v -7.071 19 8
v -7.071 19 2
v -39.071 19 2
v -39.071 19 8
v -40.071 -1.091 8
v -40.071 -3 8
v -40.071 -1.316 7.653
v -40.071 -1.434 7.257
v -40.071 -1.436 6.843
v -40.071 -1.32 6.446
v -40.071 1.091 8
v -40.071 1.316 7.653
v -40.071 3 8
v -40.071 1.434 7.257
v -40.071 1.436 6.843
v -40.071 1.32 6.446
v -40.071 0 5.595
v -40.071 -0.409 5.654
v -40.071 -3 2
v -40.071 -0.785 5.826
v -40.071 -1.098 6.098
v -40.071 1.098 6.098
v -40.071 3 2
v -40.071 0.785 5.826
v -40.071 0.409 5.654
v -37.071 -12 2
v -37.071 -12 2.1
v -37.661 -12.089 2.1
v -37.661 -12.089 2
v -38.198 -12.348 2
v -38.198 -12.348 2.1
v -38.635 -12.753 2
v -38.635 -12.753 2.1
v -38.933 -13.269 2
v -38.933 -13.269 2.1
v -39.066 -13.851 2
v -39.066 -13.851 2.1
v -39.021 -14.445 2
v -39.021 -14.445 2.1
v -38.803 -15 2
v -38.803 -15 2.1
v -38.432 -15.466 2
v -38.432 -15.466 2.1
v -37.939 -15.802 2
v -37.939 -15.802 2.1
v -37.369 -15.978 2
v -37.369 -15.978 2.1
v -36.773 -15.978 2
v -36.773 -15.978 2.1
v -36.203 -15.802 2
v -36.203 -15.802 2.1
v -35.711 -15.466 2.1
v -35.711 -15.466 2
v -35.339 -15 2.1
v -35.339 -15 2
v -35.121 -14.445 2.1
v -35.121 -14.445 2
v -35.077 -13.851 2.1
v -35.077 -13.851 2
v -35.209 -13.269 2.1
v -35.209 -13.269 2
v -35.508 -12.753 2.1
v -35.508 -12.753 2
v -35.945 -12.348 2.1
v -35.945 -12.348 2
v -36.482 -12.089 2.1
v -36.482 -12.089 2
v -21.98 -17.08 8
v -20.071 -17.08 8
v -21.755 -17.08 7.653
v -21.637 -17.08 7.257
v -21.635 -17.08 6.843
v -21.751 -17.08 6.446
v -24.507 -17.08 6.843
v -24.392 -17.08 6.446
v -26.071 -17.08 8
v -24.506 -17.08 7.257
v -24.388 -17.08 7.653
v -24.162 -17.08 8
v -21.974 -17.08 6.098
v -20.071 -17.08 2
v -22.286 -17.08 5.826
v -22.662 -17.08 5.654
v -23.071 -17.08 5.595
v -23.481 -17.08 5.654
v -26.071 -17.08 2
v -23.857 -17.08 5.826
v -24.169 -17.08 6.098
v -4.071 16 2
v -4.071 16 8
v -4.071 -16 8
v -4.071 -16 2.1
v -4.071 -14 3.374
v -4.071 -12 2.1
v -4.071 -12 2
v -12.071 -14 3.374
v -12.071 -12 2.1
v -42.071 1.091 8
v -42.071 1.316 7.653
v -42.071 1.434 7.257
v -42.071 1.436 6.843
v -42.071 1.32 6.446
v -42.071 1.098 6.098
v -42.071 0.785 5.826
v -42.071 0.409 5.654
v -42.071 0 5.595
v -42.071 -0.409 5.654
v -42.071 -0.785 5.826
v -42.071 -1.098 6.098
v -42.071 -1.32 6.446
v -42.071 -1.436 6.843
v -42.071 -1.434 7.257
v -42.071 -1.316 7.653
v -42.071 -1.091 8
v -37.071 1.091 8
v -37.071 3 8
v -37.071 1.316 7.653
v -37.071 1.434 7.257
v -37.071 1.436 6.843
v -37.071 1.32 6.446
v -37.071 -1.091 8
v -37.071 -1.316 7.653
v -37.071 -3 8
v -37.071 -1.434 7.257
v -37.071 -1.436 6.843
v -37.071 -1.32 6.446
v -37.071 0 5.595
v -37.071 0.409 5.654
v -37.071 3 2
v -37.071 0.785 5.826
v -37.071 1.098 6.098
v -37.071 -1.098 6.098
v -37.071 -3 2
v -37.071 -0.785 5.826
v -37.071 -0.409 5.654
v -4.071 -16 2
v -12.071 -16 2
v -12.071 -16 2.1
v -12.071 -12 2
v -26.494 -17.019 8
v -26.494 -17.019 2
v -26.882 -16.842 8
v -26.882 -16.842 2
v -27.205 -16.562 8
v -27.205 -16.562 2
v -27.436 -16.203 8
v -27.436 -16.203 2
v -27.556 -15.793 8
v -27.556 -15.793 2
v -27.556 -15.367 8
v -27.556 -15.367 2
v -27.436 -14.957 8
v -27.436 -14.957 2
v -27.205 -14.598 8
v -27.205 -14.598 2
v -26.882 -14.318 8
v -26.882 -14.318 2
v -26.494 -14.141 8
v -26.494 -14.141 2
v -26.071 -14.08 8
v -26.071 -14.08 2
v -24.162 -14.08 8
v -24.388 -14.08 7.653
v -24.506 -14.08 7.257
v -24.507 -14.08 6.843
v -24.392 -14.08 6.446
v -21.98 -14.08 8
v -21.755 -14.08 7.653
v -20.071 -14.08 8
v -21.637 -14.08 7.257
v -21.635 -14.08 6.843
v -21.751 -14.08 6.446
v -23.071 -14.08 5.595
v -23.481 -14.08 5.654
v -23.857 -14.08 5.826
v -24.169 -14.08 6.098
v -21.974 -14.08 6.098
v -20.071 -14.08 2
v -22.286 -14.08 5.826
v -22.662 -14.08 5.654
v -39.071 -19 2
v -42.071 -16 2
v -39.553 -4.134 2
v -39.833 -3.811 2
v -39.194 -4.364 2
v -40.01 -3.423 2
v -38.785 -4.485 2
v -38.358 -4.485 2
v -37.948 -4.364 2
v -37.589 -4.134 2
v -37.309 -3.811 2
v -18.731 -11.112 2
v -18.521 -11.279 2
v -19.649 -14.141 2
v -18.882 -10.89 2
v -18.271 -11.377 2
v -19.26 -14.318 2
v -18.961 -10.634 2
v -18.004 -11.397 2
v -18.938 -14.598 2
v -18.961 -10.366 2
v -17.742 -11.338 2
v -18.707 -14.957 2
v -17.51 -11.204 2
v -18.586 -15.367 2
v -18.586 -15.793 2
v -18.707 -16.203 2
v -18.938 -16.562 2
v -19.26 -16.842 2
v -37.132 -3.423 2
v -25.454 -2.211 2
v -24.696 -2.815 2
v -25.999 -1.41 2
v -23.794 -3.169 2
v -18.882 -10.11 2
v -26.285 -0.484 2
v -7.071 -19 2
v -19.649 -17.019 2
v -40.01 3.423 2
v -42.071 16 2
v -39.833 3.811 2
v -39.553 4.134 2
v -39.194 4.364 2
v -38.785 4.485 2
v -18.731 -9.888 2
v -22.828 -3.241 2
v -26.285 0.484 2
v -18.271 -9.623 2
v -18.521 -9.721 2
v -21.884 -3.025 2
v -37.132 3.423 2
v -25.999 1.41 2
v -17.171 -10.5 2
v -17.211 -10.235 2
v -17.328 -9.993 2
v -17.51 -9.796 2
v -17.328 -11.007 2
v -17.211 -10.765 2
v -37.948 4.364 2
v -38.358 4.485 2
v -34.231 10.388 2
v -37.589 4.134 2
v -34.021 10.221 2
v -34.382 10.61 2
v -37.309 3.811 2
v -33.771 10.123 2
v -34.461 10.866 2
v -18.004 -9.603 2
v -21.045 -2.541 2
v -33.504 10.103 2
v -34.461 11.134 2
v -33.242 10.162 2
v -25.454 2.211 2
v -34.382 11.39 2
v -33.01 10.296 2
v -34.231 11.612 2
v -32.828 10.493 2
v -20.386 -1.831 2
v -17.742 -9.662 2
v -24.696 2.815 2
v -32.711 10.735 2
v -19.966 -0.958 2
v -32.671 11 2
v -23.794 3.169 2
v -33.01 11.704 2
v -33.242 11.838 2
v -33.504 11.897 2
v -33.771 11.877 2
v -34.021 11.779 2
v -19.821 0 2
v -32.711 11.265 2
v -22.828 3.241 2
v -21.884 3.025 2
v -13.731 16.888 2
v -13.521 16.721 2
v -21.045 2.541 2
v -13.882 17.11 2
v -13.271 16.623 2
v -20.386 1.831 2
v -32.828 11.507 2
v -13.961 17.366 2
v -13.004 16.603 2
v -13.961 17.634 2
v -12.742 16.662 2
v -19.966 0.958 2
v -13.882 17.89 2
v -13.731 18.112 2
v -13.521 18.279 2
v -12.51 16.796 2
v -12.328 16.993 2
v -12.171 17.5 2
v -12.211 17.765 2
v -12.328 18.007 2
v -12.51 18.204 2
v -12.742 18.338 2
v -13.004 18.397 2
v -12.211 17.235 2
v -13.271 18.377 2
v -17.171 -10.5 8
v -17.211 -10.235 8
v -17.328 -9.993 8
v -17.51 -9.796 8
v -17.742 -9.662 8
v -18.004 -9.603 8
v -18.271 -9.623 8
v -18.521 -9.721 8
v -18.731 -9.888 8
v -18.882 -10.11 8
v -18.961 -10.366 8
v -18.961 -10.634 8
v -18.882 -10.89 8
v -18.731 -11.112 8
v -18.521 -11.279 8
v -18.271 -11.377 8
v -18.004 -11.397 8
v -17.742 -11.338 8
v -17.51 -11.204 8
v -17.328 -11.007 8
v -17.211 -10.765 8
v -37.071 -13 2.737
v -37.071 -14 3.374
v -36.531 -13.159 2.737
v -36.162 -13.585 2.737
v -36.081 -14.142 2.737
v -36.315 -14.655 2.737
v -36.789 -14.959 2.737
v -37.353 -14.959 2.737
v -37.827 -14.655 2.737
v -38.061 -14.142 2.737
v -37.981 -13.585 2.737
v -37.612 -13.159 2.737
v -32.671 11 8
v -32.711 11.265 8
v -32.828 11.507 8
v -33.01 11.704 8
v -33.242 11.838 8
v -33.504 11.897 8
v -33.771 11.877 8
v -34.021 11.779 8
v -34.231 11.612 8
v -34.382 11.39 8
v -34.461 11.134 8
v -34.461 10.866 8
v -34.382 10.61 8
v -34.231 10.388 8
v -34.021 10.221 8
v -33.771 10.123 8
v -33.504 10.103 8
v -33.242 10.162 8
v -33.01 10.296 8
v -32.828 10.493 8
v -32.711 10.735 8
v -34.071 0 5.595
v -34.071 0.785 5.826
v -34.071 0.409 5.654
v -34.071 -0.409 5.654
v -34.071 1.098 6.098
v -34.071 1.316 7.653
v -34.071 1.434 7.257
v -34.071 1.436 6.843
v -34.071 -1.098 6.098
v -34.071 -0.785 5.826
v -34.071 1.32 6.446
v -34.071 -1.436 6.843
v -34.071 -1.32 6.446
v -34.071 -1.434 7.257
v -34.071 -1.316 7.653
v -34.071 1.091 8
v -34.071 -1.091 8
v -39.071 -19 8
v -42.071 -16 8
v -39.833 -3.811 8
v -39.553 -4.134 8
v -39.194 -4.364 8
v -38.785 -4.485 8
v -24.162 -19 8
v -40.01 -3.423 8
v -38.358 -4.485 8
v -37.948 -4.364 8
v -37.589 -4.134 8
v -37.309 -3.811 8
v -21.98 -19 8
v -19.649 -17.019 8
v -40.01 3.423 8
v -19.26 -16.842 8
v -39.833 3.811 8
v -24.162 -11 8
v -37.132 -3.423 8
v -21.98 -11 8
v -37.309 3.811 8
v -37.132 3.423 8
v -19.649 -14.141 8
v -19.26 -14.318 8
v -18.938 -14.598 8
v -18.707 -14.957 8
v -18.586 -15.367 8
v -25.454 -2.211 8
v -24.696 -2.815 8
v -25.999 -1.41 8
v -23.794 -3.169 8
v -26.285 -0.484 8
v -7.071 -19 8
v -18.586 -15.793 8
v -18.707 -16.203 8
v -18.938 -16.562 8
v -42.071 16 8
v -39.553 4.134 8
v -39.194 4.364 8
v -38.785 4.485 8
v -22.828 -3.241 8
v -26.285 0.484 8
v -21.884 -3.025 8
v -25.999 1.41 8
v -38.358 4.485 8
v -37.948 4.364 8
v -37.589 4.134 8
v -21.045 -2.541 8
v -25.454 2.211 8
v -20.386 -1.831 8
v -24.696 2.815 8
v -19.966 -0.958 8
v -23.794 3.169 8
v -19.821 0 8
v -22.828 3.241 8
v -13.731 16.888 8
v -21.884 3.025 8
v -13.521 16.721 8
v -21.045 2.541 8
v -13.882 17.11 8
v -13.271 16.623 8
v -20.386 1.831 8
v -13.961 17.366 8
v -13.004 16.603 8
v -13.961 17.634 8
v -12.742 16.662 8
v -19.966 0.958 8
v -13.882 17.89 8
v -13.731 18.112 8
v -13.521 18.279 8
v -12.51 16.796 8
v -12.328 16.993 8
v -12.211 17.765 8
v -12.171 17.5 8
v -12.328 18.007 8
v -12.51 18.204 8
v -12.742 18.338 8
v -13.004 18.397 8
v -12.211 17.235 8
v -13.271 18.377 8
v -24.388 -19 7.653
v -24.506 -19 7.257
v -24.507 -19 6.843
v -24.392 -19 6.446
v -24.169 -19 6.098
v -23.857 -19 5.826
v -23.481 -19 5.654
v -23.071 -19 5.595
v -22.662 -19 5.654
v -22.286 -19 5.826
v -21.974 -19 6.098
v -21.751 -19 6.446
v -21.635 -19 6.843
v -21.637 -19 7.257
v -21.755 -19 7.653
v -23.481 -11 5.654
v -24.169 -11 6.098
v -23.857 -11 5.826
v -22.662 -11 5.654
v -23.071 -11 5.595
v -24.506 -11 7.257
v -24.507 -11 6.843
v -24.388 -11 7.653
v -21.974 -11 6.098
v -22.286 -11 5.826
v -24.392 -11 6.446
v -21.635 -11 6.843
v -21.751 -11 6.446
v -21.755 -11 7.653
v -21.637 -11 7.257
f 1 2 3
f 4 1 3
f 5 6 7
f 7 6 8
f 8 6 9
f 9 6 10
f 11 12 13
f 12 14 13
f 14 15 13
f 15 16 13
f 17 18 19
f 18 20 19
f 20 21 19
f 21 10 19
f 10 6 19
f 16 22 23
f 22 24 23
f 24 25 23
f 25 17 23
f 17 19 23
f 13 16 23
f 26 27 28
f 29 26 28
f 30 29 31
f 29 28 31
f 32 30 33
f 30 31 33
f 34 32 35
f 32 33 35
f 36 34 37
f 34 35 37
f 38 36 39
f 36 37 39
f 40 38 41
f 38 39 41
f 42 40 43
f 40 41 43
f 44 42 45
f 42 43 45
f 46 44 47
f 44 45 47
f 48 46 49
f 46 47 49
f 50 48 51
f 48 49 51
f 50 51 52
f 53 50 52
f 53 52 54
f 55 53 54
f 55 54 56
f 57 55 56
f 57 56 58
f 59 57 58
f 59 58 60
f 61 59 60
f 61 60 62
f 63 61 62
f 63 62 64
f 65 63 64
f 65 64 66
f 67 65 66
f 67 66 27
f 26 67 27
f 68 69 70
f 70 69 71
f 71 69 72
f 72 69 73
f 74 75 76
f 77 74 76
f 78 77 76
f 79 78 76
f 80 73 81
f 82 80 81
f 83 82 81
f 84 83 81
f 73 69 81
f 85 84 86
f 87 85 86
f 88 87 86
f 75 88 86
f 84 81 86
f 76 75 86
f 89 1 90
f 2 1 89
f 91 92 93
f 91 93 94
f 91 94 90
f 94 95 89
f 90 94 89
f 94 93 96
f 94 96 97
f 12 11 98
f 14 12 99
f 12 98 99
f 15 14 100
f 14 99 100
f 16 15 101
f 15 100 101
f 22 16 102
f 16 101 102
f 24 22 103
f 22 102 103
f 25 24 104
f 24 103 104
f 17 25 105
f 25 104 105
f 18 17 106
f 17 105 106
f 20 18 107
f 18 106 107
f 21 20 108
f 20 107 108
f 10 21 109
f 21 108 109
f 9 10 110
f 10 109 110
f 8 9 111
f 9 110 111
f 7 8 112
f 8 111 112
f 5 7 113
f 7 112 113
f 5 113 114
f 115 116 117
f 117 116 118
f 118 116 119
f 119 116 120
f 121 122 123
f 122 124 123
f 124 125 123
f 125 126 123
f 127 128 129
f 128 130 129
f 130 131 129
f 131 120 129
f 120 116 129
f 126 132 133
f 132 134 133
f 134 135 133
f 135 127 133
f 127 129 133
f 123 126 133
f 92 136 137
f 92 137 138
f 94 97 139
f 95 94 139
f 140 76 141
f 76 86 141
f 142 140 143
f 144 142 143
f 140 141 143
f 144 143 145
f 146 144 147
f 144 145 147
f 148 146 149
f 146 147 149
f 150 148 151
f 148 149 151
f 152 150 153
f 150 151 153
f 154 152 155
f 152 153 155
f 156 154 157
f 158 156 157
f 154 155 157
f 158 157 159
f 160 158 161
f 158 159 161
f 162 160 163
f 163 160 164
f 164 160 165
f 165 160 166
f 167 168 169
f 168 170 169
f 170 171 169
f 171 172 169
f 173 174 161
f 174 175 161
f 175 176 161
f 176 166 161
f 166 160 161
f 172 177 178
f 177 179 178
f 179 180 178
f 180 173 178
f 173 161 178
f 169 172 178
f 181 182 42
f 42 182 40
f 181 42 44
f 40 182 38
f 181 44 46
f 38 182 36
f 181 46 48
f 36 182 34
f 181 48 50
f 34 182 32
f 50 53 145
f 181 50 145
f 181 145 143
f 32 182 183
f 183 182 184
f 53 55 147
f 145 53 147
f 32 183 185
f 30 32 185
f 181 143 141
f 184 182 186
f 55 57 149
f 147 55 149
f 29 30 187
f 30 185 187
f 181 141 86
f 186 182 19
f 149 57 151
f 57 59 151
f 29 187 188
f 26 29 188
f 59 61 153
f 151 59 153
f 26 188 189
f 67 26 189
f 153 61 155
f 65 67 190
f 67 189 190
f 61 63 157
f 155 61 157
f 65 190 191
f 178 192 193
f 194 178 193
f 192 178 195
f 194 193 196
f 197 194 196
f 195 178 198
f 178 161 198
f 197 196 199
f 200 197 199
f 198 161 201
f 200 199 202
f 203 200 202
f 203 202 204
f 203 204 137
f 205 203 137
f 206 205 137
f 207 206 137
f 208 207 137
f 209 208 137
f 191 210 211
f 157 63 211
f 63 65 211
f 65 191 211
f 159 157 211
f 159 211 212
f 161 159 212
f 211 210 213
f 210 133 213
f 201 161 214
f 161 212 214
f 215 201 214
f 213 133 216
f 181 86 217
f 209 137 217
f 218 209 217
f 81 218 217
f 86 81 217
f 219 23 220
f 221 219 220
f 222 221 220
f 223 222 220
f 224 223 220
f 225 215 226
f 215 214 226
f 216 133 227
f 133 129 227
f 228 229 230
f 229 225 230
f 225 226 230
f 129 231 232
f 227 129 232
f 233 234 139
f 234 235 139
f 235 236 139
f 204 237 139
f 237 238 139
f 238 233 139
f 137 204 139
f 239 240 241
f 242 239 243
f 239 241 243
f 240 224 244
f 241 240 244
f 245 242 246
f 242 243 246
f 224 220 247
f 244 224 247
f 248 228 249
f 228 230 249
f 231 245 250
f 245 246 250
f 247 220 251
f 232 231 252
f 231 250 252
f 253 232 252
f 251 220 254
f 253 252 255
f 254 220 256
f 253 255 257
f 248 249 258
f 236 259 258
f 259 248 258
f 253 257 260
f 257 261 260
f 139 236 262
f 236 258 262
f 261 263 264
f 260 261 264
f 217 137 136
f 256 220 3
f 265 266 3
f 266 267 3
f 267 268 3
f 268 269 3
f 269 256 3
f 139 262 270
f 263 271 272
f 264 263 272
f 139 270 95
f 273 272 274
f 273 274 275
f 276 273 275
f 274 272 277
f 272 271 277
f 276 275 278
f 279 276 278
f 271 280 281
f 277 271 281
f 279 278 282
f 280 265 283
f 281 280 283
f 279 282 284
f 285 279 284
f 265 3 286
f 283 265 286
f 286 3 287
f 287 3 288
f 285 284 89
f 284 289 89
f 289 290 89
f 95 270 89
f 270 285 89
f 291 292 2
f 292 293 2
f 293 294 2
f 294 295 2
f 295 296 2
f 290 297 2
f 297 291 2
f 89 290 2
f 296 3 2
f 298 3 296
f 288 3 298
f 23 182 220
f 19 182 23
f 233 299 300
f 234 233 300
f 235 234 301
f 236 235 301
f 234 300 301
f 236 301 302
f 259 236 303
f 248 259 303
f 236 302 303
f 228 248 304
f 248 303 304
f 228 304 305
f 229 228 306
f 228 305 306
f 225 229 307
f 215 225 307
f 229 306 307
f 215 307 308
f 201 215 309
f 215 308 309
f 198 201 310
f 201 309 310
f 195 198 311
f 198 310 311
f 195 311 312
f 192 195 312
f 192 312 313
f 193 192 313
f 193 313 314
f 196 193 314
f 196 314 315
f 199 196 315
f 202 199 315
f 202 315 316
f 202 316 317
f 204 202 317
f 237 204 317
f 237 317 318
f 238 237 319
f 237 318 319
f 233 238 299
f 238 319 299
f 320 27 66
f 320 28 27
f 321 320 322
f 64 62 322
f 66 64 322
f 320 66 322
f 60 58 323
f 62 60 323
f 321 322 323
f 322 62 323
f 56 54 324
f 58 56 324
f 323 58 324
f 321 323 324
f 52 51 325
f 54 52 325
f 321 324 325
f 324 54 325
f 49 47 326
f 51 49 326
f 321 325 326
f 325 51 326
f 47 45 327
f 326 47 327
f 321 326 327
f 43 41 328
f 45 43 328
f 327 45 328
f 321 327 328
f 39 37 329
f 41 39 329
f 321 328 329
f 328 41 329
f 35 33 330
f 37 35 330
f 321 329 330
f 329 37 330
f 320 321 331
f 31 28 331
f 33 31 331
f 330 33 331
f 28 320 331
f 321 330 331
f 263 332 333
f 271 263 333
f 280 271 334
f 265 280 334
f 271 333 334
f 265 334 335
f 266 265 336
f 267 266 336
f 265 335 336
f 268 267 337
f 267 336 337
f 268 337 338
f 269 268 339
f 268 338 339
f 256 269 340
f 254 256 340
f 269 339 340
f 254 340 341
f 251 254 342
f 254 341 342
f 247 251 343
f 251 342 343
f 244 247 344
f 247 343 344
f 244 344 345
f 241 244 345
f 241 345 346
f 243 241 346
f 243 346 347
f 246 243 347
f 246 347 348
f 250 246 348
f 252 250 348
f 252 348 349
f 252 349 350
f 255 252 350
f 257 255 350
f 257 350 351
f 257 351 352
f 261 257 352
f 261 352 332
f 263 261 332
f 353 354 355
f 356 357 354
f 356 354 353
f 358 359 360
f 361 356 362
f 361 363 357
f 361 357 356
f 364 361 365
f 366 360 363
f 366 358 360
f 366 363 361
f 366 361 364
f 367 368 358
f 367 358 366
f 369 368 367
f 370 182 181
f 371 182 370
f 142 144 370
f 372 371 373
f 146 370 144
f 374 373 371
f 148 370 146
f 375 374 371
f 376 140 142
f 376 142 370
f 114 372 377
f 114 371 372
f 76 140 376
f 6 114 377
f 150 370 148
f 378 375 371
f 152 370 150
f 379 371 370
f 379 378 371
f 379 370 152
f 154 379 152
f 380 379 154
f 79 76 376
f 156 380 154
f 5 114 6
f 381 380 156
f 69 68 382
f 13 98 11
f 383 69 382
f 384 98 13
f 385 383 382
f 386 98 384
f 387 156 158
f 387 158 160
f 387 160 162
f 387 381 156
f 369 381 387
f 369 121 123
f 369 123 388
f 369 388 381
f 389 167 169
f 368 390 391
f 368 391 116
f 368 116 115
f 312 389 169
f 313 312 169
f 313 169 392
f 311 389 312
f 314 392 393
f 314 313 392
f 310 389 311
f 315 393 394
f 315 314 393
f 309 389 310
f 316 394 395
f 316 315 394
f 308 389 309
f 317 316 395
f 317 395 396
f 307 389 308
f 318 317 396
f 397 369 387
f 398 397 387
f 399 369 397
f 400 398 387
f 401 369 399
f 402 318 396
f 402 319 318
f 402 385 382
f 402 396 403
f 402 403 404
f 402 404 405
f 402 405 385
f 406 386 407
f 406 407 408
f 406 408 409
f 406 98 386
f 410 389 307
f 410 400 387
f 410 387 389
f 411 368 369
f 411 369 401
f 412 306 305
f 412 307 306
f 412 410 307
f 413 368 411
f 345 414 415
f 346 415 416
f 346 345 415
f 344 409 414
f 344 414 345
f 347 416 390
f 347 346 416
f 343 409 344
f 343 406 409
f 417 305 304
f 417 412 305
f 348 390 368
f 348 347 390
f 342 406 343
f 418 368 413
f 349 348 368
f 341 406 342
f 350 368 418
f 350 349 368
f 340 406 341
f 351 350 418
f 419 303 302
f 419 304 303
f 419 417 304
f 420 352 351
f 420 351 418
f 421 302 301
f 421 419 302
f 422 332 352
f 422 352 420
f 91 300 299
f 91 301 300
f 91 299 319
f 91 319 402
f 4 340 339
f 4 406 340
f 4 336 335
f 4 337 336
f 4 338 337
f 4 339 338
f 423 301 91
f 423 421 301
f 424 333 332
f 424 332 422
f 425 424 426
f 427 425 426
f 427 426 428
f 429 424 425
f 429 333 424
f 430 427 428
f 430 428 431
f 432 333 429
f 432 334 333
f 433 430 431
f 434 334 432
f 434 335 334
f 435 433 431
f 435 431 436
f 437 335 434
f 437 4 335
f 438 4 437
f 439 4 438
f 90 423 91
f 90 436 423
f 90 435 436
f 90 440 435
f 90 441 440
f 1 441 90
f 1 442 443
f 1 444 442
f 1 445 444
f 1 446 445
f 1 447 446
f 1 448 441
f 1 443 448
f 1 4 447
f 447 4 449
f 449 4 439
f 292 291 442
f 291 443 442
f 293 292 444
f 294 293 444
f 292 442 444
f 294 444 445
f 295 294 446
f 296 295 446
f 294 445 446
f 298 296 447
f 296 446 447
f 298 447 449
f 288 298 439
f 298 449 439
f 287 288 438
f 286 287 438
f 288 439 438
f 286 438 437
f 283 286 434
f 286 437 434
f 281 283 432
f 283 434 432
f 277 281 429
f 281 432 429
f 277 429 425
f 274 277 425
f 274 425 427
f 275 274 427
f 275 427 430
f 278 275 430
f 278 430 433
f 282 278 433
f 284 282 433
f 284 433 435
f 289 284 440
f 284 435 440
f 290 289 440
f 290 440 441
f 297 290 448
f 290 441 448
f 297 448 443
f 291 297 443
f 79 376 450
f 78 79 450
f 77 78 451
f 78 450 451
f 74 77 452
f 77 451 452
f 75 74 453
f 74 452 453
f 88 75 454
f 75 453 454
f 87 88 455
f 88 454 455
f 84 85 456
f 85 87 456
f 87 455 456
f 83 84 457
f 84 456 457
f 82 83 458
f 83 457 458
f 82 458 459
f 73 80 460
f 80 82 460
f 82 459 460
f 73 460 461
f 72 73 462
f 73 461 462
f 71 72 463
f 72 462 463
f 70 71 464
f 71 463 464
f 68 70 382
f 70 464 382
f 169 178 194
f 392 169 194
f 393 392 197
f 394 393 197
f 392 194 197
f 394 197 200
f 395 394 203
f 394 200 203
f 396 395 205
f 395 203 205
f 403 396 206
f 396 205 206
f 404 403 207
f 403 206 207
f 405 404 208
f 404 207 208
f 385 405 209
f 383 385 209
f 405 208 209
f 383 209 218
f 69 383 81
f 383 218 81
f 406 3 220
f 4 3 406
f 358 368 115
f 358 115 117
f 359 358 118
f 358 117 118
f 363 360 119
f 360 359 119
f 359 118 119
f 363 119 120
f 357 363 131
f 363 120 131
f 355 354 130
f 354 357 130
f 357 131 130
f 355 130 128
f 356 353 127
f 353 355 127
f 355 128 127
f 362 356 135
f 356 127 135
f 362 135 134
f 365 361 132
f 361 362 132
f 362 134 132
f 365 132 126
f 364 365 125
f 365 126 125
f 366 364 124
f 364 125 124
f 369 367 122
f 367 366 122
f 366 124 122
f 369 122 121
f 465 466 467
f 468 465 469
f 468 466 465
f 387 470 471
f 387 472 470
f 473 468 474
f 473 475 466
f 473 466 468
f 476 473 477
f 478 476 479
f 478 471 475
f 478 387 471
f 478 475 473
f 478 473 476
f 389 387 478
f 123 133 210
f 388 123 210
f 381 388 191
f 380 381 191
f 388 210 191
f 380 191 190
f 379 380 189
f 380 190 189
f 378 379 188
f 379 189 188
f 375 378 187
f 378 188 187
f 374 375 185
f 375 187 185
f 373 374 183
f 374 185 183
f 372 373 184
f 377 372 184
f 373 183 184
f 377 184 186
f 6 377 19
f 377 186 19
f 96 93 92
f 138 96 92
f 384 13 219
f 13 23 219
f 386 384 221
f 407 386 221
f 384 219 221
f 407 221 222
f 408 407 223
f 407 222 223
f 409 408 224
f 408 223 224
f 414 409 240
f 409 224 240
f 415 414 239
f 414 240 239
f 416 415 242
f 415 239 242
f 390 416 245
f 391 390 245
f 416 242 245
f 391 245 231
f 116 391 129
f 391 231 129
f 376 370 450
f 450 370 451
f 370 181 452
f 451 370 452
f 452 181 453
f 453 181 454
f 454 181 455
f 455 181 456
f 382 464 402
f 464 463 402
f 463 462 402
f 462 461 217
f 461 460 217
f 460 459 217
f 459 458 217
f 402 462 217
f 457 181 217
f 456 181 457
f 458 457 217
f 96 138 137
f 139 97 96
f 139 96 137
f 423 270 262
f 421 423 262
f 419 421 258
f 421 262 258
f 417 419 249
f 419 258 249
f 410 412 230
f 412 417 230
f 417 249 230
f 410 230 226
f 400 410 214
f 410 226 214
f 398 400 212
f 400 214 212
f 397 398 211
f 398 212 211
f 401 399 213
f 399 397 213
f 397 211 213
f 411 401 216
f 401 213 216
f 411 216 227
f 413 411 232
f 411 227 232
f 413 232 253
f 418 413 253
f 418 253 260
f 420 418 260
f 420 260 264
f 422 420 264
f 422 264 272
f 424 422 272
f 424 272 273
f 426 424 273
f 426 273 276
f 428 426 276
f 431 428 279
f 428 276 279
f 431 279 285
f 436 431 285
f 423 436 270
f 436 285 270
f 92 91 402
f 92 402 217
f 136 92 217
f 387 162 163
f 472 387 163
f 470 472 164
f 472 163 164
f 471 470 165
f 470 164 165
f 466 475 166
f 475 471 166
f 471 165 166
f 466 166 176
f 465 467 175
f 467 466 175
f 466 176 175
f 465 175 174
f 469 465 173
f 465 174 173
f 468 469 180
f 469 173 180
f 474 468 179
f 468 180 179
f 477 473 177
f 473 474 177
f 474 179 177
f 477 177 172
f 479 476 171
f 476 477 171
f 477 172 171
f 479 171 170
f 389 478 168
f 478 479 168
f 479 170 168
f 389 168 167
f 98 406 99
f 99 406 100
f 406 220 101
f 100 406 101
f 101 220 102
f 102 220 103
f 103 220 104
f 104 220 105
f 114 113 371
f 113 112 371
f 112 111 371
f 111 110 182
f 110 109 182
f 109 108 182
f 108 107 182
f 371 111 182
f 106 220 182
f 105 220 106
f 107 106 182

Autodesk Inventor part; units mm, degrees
ref_plane "YZ Plane" through (0, 0, 0) normal (1, 0, 0) x (0, 1, 0)
ref_plane "XZ Plane" through (0, 0, 0) normal (0, 1, 0) x (-1, 0, 0)
ref_plane "XY Plane" through (0, 0, 0) normal (0, 0, 1) x (1, 0, 0)
ref_plane "Work Plane1" through (0, 0, 2) normal (0, 0, 1) x (1, 0, 0)
sketch "Sketch1" plane through (0, 0, 2) normal (0, 0, 1) x (1, 0, 0)
  circle A0 centre (-37.0712, 14) radius 3.25 construction
  circle A1 centre (-9.0712, -14) radius 3.25 construction
  line L0 (-26.0712, -17.08) -> (-20.0712, -17.08) construction
  arc A2 (-20.0712, -17.08) -> (-20.0712, -14.08) centre (-20.0712, -15.58) ccw construction
  line L1 (-20.0712, -14.08) -> (-26.0712, -14.08) construction
  line L2 (-37.0712, -3) -> (-37.0712, 3) construction
  arc A3 (-37.0712, 3) -> (-40.0712, 3) centre (-38.5712, 3) ccw construction
  line L3 (-40.0712, 3) -> (-40.0712, -3) construction
  line L4 (-47.9712, -17) -> (-47.9712, 17) construction
  line L5 (-47.9712, 17) -> (-44.3964, 17) construction
  line L6 (-44.3964, 17) -> (-40.0712, 21.3252) construction
  line L7 (-40.0712, 21.3252) -> (-40.0712, 24.9) construction
  line L8 (-40.0712, 24.9) -> (-6.0712, 24.9) construction
  line L9 (-6.0712, 24.9) -> (-6.0712, 21.3252) construction
  line L10 (-6.0712, 21.3252) -> (-1.746, 17) construction
  line L11 (-1.746, 17) -> (1.8288, 17) construction
  line L12 (1.8288, 17) -> (1.8288, -17) construction
  line L13 (1.8288, -17) -> (-1.746, -17) construction
  line L14 (-1.746, -17) -> (-6.1126, -21.3666) construction
  line L15 (-6.1126, -21.3666) -> (-6.1126, -24.9) construction
  line L16 (-6.1126, -24.9) -> (-40.0712, -24.9) construction
  circle A4 centre (-37.0712, -14) radius 3.25 construction
  circle A5 centre (-23.0712, 0) radius 12.45 construction
  circle A6 centre (-23.0712, 0) radius 12.7 construction
  line L17 (-37.0712, 14) -> (-9.0712, 14) construction
  line L18 (-9.0712, 14) -> (-9.0712, -14) construction
  line L19 (-9.0712, -14) -> (-37.0712, -14) construction
  line L20 (-37.0712, -14) -> (-37.0712, 14) construction
  line L21 (-4.0712, -19) -> (-4.0712, 19)
  line L22 (-4.0712, 19) -> (-42.0712, 19)
  line L23 (-42.0712, 19) -> (-42.0712, -19)
  line L24 (-42.0712, -19) -> (-4.0712, -19)
  circle A7 centre (-23.0712, 0) radius 12.8
  circle A8 centre (-23.0712, 0) radius 3.25 projected
  line L25 (-40.0712, -24.9) -> (-40.0712, -21.3252) projected
  line L26 (-40.0712, -21.3252) -> (-44.3964, -17) projected
  line L27 (-44.3964, -17) -> (-47.9712, -17) projected
  arc A9 (-26.0712, -14.08) -> (-26.0712, -17.08) centre (-26.0712, -15.58) ccw projected
  arc A10 (-40.0712, -3) -> (-37.0712, -3) centre (-38.5712, -3) ccw projected
  circle A11 centre (-37.0712, -14) radius 3.25 projected
  point P0 (0, 0)
  point P1 (-21.8762, -3.0223)
  point P2 (-25.9925, 1.4242)
  dimension "d0" = 5
  dimension "d1" = 0.1
extrude "Extrusion1" add sketch "Sketch1" along normal blind 6 contours L24 L23 L22 L21 | A7 | A11
sketch "Sketch2" plane through (0, 0, 2) normal (0, 0, -1) x (-1, 0, 0)
  circle A0 centre (23.0712, 0) radius 12.8 projected
  circle A1 centre (23.0712, 0) radius 8.5824
  point P0 (0, 0)
extrude "Extrusion2" add sketch "Sketch2" against normal blind 0.5
sketch "Sketch3" plane through (0, 0, 2) normal (0, 0, -1) x (-1, 0, 0)
  circle A0 centre (9.0712, -14) radius 1.45 construction
  circle A1 centre (9.0712, -14) radius 2.45
  circle A2 centre (37.0712, -14) radius 1.45 projected
  circle A3 centre (37.0712, -14) radius 1.95
  point P0 (0, 0)
  dimension "d8" = 1
  dimension "d10" = 0.5
sketch "Sketch5" plane through (0, 0, 2) normal (0, 0, -1) x (-1, 0, 0)
  arc A0 (20.0712, -14.08) -> (20.0712, -17.08) centre (20.0712, -15.58) ccw projected
  arc A1 (26.0712, -17.08) -> (26.0712, -14.08) centre (26.0712, -15.58) ccw projected
  line L0 (37.0712, 3) -> (37.0712, -3) projected
  arc A2 (37.0712, -3) -> (40.0712, -3) centre (38.5712, -3) ccw projected
  line L1 (40.0712, -3) -> (40.0712, 3) projected
  arc A3 (40.0712, 3) -> (37.0712, 3) centre (38.5712, 3) ccw projected
  line L2 (26.0712, -14.08) -> (20.0712, -14.08) projected
  arc A4 (20.0712, -14.08) -> (20.0712, -17.08) centre (20.0712, -15.58) ccw projected
  line L3 (20.0712, -17.08) -> (26.0712, -17.08) projected
  arc A5 (26.0712, -17.08) -> (26.0712, -14.08) centre (26.0712, -15.58) ccw projected
  circle A6 centre (37.0712, -14) radius 1.45 projected
  circle A7 centre (23.0712, 0) radius 1.45 projected
  circle A8 centre (9.0712, -14) radius 1.45 projected
  circle A9 centre (37.0712, 14) radius 1.45 projected
  line L4 (-1.8288, -17) -> (-1.8288, 17) projected
  line L5 (-1.8288, 17) -> (1.746, 17) projected
  line L6 (1.746, 17) -> (6.0712, 21.3252) projected
  line L7 (6.0712, 21.3252) -> (6.0712, 24.9) projected
  line L8 (6.0712, 24.9) -> (40.0712, 24.9) projected
  line L9 (40.0712, 24.9) -> (40.0712, 21.3252) projected
  line L10 (40.0712, 21.3252) -> (44.3964, 17) projected
  line L11 (44.3964, 17) -> (47.9712, 17) projected
  line L12 (47.9712, 17) -> (47.9712, -17) projected
  line L13 (44.3964, -17) -> (47.9712, -17) projected
  line L14 (40.0712, -21.3252) -> (44.3964, -17) projected
  line L15 (40.0712, -24.9) -> (40.0712, -21.3252) projected
  line L16 (6.1126, -24.9) -> (40.0712, -24.9) projected
  line L17 (6.1126, -24.9) -> (6.1126, -21.3666) projected
  line L18 (6.1126, -21.3666) -> (1.746, -17) projected
  line L19 (1.746, -17) -> (-1.8288, -17) projected
  point P0 (0, 0)
  point P1 (40.0712, -3)
extrude "Extrusion5" cut sketch "Sketch5" against normal blind 8 contours L2 A1 L3 A0 | A3 L1 A2 L0
sketch "Sketch6" plane through (-42.0712, -19, 8) normal (0, -1, 0) x (1, 0, 0)
  line L0 (0, -6) -> (38, -6) projected
  line L1 (38, -6) -> (38, 0) projected
  line L2 (0, 0) -> (38, 0) projected
  line L3 (0, -6) -> (0, 0) projected
  line L4 (31.8, 0) -> (31.8, 0) projected
  circle A0 centre (19, -0.9548) radius 1.45
  point P0 (42.0712, -8)
  point P1 (4.5, 0)
  dimension "d34" = 2.9
extrude "Extrusion6" cut sketch "Sketch6" against normal blind 8 contours A0 L2 | L2 A0
pattern_circular "Circular Pattern1" count 2 over 90 about axis through (-23.0712, 0, 2) along (0, 0, -1) of "Extrusion6"
chamfer "Chamfer1" distance 3 angle 45 4 edges at (-42.0712, 19, 5) (-4.0712, 19, 5) (-4.0712, -19, 5) (-42.0712, -19, 5)
hole "Hole1" at (-37.0712, -14, 2) direction (0, 0, 1) diameter 4 depth 0.1 tip angle 115
sketch "Sketch4" plane through (-4.0712, -19, 2) normal (1, 0, 0) x (0, 0, -1)
  line L0 (2, 4.45) -> (6, 4.45)
  line L1 (2, 1.55) -> (6, 1.55)
  line L2 (0, 0) -> (0, 38) projected
  arc A0 (2, 19) -> (2, 19) centre (1.5, 4.4206) ccw projected
  line L3 (-1.3741, 5) -> (-0.1, 7) projected
  line L4 (-1.3741, 5) -> (-0.1, 3) projected
  line L5 (-0.1, 7) -> (0.6045, 7)
  line L6 (0.6045, 7) -> (0.6045, 3)
  line L7 (0.6045, 3) -> (-0.1, 3)
  line L8 (-0.1, 3) -> (-0.1, 7)
extrude "Extrusion4" cut sketch "Sketch4" against normal blind 8 contours L7 L8 L5 L2 | L2 L5 L6 L7 | L4 L3 L8
sketch "Sketch7" plane through (0, 0, 8) normal (0, 0, 1) x (1, 0, 0)
  circle A0 centre (-18.0712, -10.5) radius 1
  circle A1 centre (-33.5712, 11) radius 1
  circle A2 centre (-13.0712, 17.5) radius 1
  circle A3 centre (-18.0712, -10.5) radius 0.9
  circle A4 centre (-33.5712, 11) radius 0.9
  circle A5 centre (-13.0712, 17.5) radius 0.9
  point P0 (0, 0)
  dimension "d44" = 1.8
  dimension "d45" = 1.8
  dimension "d46" = 1.8
extrude "Extrusion7" cut sketch "Sketch7" against normal through all contours A3 | A4 | A5
ref_plane "Arbeitsebene2" through (-23.0712, 0, 7.0452) normal (-1, 0, 0) x (0, 0, 1)
ref_plane "Arbeitsebene3" through (-23.0712, 0, 7.0452) normal (0, -1, 0) x (1, 0, 0)
properties part number "20_Cube_Insert_Kinematic_Mirrormount_90_pro_v3"
